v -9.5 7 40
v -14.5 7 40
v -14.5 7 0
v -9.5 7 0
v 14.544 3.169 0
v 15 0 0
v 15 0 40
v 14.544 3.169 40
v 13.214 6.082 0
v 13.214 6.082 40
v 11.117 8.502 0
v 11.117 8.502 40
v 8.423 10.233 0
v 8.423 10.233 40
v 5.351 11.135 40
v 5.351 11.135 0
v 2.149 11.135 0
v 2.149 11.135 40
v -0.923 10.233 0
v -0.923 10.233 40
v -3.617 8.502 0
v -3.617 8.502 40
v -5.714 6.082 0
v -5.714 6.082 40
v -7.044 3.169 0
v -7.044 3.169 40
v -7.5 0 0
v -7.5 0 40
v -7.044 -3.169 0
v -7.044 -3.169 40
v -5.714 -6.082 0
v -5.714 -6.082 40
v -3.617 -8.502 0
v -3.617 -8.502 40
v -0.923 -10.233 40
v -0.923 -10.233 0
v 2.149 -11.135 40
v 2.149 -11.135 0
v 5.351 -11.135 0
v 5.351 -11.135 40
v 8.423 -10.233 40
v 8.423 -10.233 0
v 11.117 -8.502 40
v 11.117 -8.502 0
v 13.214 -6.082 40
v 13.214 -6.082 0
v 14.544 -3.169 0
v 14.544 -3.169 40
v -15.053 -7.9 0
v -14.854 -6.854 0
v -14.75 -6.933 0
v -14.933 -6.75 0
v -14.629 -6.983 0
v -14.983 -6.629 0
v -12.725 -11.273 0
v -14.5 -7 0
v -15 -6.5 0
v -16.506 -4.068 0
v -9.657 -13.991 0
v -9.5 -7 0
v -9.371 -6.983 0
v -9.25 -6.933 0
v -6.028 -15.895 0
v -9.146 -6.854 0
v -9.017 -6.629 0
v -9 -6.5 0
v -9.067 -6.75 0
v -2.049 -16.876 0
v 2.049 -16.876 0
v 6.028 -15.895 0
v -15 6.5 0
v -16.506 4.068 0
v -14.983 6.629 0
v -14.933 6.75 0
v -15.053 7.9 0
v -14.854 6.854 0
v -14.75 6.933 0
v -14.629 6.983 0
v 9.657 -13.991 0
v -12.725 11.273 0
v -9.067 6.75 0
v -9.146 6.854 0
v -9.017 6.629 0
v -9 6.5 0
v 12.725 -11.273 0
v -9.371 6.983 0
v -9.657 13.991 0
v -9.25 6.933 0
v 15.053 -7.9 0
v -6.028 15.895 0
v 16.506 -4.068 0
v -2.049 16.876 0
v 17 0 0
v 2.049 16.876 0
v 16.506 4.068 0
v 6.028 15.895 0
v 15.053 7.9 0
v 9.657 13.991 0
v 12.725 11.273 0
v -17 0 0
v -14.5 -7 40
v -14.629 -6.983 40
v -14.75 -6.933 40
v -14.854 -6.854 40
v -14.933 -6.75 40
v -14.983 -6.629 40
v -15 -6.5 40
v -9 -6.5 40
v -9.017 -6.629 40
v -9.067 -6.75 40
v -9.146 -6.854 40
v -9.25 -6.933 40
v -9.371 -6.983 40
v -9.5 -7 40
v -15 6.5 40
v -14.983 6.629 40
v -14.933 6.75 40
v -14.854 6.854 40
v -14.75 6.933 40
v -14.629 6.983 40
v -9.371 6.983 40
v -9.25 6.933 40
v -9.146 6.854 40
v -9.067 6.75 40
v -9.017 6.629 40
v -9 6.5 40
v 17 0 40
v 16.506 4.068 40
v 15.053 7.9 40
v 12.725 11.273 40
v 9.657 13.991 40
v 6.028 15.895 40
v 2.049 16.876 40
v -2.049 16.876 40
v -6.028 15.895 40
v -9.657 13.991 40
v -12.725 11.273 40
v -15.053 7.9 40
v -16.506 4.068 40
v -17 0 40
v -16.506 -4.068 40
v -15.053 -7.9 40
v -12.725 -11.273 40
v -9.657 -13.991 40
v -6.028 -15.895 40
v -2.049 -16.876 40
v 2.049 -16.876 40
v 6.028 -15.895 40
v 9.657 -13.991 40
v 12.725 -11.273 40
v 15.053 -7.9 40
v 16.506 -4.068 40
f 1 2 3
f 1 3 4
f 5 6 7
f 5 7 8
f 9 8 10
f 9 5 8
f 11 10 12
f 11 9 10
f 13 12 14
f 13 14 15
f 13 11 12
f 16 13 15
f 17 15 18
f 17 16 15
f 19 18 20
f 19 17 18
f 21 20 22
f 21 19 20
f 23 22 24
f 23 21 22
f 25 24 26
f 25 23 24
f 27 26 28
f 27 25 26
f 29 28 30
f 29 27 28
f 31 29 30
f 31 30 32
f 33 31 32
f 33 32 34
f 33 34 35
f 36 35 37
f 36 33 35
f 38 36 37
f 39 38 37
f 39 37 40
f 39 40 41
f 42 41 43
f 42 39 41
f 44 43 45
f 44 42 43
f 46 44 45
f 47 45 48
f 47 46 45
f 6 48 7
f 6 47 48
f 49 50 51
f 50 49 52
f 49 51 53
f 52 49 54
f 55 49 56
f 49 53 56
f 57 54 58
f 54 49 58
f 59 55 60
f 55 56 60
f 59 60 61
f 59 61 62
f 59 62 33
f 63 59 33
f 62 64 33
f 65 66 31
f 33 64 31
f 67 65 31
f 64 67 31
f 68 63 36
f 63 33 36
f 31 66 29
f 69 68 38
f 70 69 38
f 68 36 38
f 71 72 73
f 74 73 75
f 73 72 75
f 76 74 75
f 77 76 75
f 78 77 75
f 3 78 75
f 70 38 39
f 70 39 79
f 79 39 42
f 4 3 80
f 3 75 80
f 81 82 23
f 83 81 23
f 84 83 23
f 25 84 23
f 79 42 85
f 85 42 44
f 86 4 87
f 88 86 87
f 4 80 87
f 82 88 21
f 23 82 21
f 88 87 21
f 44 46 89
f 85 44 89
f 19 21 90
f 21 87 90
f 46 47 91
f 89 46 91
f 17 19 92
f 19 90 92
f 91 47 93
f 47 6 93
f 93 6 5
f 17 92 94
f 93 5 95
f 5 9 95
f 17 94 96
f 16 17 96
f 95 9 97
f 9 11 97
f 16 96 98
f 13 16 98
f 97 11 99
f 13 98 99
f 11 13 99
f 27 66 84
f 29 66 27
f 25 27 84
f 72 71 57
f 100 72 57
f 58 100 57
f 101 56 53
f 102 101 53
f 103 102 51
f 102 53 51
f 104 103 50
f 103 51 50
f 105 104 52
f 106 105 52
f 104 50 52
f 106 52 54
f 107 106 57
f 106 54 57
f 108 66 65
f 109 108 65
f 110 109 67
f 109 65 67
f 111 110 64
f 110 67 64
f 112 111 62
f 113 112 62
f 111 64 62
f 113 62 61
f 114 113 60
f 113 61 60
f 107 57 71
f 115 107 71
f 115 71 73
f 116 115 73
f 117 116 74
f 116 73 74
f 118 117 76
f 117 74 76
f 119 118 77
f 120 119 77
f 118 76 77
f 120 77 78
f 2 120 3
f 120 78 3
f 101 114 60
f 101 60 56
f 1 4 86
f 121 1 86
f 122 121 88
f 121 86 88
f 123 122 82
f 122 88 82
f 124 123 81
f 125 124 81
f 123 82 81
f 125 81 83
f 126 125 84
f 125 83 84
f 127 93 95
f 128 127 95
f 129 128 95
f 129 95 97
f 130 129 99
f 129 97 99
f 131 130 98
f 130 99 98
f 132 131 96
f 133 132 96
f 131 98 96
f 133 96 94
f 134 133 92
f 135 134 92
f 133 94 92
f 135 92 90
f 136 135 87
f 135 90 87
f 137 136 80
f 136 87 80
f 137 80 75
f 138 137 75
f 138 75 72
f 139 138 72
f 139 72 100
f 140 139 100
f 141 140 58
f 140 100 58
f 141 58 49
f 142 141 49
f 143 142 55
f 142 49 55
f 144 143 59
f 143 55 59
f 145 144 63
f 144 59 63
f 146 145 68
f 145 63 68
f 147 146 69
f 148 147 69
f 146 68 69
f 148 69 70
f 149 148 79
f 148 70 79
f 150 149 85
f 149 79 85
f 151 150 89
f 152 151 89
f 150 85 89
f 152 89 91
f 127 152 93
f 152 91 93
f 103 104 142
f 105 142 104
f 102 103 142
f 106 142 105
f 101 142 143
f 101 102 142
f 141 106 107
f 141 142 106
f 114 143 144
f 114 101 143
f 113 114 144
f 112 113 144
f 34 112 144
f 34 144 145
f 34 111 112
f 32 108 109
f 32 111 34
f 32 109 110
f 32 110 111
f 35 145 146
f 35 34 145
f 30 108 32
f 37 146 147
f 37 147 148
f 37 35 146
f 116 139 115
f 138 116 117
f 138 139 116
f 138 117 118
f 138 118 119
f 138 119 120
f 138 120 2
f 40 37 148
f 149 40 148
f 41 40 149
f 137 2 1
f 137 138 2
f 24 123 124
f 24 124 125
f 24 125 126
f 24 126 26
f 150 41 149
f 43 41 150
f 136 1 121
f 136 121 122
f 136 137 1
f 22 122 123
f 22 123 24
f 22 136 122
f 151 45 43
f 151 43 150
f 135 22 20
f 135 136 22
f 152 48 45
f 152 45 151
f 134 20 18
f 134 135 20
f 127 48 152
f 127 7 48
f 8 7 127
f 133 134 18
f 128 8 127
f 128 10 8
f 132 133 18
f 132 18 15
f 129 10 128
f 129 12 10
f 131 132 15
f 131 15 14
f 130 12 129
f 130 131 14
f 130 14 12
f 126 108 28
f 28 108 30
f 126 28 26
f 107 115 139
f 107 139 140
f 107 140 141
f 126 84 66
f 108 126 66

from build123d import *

# Parameters (mm, degrees)
F0_R     = 17
F0_R_2   = 11.25
F1_DEPTH = 40


with BuildPart() as f1:
    # F0 (on Top) → F1 (new body)
    with BuildSketch(Plane.XY):
        Circle(F0_R)
        with BuildLine():
            ThreePointArc((-9, -6.5), (-9.146447, -6.853553), (-9.5, -7))
            Line((-9.5, -7), (-14.5, -7))
            ThreePointArc((-14.5, -7), (-14.853553, -6.853553), (-15, -6.5))
            Line((-15, -6.5), (-15, 6.5))
            ThreePointArc((-15, 6.5), (-14.853553, 6.853553), (-14.5, 7))
            Line((-14.5, 7), (-9.5, 7))
            ThreePointArc((-9.5, 7), (-9.146447, 6.853553), (-9, 6.5))
            Line((-9, 6.5), (-9, -6.5))
        make_face(mode=Mode.SUBTRACT)
        with Locations((3.75, 0)):
            Circle(F0_R_2, mode=Mode.SUBTRACT)
    extrude(amount=F1_DEPTH)


solid = f1.part
